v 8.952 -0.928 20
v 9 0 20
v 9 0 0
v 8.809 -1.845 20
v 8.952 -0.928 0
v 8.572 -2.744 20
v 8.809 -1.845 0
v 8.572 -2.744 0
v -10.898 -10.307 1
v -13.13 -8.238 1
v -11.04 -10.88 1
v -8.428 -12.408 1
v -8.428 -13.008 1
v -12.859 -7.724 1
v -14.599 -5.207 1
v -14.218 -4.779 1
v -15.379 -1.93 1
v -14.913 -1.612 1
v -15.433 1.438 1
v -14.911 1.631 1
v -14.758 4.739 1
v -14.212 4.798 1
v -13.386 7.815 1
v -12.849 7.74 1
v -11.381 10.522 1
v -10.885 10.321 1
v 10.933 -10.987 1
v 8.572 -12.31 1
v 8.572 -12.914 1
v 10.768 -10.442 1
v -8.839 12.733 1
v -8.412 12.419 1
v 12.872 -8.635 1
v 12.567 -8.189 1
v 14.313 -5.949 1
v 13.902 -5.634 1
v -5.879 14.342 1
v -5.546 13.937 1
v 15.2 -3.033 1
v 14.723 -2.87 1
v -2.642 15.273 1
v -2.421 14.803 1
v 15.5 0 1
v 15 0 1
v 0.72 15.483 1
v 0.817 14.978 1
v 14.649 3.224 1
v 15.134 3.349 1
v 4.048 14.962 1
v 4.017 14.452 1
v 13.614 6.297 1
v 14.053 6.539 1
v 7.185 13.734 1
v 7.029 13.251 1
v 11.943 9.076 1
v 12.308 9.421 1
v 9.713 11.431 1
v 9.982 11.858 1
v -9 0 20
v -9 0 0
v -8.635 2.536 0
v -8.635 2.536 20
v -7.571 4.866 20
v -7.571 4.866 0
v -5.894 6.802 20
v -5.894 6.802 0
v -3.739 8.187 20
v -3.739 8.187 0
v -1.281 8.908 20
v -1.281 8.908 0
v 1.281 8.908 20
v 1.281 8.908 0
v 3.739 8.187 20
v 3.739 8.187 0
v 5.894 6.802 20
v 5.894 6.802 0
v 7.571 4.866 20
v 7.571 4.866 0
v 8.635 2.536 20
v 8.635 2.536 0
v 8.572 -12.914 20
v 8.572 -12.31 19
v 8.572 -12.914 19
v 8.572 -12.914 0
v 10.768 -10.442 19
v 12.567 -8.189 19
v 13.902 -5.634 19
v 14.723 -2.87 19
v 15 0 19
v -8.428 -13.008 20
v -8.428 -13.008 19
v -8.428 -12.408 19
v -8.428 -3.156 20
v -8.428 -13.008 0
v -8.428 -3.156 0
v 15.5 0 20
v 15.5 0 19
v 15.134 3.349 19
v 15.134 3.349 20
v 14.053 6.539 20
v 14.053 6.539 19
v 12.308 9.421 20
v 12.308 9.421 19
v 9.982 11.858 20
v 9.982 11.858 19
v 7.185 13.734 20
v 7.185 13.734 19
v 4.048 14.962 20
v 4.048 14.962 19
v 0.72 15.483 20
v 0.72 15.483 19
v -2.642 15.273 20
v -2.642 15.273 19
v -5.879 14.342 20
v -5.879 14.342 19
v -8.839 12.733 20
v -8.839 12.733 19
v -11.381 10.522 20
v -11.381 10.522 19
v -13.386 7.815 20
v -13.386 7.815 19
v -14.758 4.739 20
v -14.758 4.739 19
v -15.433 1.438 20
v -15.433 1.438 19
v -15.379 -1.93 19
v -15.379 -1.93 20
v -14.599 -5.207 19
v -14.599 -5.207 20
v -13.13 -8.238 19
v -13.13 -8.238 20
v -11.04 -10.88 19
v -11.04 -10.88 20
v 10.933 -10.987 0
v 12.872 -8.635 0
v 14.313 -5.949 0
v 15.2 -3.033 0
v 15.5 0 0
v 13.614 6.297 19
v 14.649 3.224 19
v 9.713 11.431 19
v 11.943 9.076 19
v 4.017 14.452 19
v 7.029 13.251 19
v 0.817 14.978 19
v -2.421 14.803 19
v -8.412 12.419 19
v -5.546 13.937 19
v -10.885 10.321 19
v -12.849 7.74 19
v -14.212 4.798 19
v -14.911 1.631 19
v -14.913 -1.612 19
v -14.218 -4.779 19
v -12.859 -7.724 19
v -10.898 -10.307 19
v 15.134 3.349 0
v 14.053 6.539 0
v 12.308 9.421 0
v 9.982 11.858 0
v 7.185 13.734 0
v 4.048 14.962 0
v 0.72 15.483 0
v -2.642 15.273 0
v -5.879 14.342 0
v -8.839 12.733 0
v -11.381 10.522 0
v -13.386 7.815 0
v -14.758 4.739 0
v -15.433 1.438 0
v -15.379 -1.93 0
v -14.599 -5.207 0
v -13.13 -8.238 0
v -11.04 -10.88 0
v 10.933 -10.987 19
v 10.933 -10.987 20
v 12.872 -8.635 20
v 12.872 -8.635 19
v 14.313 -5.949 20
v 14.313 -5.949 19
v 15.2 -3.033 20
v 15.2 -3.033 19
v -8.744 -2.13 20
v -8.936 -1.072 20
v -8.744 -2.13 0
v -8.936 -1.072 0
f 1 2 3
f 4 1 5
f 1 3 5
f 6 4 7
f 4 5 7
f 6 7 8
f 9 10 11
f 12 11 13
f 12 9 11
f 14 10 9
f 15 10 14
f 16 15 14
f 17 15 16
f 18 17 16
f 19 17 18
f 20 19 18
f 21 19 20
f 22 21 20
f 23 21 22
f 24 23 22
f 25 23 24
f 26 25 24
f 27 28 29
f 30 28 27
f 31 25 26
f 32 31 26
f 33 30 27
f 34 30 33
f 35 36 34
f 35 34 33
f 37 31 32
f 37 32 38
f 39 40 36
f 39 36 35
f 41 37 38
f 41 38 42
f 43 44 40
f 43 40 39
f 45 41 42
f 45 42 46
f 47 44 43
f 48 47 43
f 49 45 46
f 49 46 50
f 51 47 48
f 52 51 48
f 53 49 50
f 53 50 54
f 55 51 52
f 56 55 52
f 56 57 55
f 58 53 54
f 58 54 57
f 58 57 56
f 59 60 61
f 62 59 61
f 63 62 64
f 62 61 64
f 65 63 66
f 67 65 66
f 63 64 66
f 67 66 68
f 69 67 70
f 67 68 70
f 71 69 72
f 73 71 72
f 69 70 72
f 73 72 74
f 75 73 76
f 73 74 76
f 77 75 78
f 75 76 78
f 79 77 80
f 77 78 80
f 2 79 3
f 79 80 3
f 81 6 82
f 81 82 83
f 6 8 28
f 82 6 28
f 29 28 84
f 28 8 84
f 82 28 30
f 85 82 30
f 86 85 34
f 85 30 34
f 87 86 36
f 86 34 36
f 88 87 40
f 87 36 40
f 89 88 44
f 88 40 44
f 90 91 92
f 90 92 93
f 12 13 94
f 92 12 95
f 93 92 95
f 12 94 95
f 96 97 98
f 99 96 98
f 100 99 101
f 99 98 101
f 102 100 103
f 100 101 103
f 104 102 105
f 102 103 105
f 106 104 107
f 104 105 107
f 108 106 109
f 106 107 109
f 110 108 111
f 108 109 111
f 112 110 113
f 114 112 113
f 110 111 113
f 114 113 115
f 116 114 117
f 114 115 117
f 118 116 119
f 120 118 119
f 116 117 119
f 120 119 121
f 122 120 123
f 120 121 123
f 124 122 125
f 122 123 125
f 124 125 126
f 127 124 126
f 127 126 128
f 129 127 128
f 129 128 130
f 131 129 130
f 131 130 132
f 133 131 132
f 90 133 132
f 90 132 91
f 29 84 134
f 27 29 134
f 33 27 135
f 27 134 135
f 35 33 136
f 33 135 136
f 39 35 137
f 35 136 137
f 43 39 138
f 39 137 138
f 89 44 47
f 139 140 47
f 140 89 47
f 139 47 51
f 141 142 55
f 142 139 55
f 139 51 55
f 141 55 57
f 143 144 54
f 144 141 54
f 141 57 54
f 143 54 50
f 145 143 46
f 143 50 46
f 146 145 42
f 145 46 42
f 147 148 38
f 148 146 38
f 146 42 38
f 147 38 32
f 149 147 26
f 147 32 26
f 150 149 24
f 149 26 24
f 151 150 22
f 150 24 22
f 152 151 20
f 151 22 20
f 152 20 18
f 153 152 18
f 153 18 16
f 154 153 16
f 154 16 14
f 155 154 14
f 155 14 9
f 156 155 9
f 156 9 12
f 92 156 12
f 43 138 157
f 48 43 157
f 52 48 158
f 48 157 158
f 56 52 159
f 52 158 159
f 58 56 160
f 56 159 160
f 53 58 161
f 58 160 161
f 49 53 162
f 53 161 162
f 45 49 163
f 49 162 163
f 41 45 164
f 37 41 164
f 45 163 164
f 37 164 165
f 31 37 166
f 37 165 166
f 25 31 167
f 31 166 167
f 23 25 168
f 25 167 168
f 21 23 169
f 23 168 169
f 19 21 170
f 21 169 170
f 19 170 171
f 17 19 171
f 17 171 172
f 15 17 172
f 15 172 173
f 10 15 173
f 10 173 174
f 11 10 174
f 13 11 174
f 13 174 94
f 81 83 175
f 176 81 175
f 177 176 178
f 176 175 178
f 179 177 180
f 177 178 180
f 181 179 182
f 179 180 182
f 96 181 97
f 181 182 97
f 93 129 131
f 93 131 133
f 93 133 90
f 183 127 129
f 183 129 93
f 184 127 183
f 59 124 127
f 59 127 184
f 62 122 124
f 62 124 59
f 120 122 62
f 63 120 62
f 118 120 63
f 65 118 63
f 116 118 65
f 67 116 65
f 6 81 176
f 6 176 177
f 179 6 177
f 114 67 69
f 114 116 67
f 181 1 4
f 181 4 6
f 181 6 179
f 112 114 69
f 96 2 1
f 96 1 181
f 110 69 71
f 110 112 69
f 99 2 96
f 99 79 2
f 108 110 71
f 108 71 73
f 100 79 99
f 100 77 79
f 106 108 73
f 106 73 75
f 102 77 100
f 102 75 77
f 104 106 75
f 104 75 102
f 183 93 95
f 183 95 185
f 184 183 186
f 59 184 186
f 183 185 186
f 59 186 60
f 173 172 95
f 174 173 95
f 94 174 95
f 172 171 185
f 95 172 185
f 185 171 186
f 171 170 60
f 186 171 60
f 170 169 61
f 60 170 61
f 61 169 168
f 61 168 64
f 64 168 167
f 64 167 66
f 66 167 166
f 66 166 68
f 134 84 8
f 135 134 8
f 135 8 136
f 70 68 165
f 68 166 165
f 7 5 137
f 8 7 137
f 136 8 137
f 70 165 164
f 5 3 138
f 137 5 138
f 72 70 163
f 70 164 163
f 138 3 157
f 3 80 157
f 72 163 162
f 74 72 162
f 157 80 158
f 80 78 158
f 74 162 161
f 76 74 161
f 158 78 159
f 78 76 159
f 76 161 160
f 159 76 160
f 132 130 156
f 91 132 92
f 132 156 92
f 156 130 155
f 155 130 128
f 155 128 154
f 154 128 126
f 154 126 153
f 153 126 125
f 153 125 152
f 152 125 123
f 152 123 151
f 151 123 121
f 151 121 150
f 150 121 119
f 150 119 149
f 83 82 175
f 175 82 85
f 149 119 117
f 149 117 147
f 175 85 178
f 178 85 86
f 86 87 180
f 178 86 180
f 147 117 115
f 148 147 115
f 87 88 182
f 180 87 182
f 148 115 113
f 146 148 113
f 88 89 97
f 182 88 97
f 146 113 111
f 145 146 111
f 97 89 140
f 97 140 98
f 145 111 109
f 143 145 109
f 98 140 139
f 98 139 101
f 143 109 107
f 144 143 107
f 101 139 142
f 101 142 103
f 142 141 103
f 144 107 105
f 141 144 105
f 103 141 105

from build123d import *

# Parameters (mm, degrees)
F1_DEPTH = 20
F2_DEPTH = 1
F3_START = 19
F3_DEPTH = 1


with BuildPart() as f1:
    # F0 (on Top) → F1 (new body)
    with BuildSketch(Plane.XY):
        with BuildLine():
            ThreePointArc((-9, 0), (0, 9), (9, 0))
            ThreePointArc((9, 0), (8.89226485, -1.388389656), (8.5716387029, -2.7435396748))
            Line((8.5716387029, -2.7435396748), (8.5716387029, -12.3096307803))
            ThreePointArc((8.5716387029, -12.3096307803), (13.2961381714, -6.9435372634), (15, 0))
            ThreePointArc((15, 0), (-7.0204907429, 13.2556670797), (-8.4283612971, -12.4081717366))
            Line((-8.4283612971, -12.4081717366), (-8.4283612971, -3.1563785967))
            ThreePointArc((-8.4283612971, -3.1563785967), (-8.8559373212, -1.6038622644), (-9, 0))
        make_face()
    extrude(amount=F1_DEPTH)

    # F0 (on Top) → F2 (join)
    with BuildSketch(Plane.XY):
        with BuildLine():
            ThreePointArc((15, 0), (13.2961381714, -6.9435372634), (8.5716387029, -12.3096307803))
            Line((8.5716387029, -12.3096307803), (8.5716387029, -12.9142173571))
            ThreePointArc((8.5716387029, -12.9142173571), (13.6585211479, -7.3276735771), (15.5, 0))
            ThreePointArc((15.5, 0), (-7.4030534205, 13.6178118673), (-8.4283612971, -13.0081791902))
            Line((-8.4283612971, -13.0081791902), (-8.4283612971, -12.4081717366))
            ThreePointArc((-8.4283612971, -12.4081717366), (-7.0204907429, 13.2556670797), (15, 0))
        make_face()
    extrude(amount=F2_DEPTH)

    # F0 (on Top) → F3 (join)
    with BuildSketch(Plane.XY.offset(F3_START)):
        with BuildLine():
            ThreePointArc((15, 0), (13.2961381714, -6.9435372634), (8.5716387029, -12.3096307803))
            Line((8.5716387029, -12.3096307803), (8.5716387029, -12.9142173571))
            ThreePointArc((8.5716387029, -12.9142173571), (13.6585211479, -7.3276735771), (15.5, 0))
            ThreePointArc((15.5, 0), (-7.4030534205, 13.6178118673), (-8.4283612971, -13.0081791902))
            Line((-8.4283612971, -13.0081791902), (-8.4283612971, -12.4081717366))
            ThreePointArc((-8.4283612971, -12.4081717366), (-7.0204907429, 13.2556670797), (15, 0))
        make_face()
    extrude(amount=F3_DEPTH)


solid = f1.part
